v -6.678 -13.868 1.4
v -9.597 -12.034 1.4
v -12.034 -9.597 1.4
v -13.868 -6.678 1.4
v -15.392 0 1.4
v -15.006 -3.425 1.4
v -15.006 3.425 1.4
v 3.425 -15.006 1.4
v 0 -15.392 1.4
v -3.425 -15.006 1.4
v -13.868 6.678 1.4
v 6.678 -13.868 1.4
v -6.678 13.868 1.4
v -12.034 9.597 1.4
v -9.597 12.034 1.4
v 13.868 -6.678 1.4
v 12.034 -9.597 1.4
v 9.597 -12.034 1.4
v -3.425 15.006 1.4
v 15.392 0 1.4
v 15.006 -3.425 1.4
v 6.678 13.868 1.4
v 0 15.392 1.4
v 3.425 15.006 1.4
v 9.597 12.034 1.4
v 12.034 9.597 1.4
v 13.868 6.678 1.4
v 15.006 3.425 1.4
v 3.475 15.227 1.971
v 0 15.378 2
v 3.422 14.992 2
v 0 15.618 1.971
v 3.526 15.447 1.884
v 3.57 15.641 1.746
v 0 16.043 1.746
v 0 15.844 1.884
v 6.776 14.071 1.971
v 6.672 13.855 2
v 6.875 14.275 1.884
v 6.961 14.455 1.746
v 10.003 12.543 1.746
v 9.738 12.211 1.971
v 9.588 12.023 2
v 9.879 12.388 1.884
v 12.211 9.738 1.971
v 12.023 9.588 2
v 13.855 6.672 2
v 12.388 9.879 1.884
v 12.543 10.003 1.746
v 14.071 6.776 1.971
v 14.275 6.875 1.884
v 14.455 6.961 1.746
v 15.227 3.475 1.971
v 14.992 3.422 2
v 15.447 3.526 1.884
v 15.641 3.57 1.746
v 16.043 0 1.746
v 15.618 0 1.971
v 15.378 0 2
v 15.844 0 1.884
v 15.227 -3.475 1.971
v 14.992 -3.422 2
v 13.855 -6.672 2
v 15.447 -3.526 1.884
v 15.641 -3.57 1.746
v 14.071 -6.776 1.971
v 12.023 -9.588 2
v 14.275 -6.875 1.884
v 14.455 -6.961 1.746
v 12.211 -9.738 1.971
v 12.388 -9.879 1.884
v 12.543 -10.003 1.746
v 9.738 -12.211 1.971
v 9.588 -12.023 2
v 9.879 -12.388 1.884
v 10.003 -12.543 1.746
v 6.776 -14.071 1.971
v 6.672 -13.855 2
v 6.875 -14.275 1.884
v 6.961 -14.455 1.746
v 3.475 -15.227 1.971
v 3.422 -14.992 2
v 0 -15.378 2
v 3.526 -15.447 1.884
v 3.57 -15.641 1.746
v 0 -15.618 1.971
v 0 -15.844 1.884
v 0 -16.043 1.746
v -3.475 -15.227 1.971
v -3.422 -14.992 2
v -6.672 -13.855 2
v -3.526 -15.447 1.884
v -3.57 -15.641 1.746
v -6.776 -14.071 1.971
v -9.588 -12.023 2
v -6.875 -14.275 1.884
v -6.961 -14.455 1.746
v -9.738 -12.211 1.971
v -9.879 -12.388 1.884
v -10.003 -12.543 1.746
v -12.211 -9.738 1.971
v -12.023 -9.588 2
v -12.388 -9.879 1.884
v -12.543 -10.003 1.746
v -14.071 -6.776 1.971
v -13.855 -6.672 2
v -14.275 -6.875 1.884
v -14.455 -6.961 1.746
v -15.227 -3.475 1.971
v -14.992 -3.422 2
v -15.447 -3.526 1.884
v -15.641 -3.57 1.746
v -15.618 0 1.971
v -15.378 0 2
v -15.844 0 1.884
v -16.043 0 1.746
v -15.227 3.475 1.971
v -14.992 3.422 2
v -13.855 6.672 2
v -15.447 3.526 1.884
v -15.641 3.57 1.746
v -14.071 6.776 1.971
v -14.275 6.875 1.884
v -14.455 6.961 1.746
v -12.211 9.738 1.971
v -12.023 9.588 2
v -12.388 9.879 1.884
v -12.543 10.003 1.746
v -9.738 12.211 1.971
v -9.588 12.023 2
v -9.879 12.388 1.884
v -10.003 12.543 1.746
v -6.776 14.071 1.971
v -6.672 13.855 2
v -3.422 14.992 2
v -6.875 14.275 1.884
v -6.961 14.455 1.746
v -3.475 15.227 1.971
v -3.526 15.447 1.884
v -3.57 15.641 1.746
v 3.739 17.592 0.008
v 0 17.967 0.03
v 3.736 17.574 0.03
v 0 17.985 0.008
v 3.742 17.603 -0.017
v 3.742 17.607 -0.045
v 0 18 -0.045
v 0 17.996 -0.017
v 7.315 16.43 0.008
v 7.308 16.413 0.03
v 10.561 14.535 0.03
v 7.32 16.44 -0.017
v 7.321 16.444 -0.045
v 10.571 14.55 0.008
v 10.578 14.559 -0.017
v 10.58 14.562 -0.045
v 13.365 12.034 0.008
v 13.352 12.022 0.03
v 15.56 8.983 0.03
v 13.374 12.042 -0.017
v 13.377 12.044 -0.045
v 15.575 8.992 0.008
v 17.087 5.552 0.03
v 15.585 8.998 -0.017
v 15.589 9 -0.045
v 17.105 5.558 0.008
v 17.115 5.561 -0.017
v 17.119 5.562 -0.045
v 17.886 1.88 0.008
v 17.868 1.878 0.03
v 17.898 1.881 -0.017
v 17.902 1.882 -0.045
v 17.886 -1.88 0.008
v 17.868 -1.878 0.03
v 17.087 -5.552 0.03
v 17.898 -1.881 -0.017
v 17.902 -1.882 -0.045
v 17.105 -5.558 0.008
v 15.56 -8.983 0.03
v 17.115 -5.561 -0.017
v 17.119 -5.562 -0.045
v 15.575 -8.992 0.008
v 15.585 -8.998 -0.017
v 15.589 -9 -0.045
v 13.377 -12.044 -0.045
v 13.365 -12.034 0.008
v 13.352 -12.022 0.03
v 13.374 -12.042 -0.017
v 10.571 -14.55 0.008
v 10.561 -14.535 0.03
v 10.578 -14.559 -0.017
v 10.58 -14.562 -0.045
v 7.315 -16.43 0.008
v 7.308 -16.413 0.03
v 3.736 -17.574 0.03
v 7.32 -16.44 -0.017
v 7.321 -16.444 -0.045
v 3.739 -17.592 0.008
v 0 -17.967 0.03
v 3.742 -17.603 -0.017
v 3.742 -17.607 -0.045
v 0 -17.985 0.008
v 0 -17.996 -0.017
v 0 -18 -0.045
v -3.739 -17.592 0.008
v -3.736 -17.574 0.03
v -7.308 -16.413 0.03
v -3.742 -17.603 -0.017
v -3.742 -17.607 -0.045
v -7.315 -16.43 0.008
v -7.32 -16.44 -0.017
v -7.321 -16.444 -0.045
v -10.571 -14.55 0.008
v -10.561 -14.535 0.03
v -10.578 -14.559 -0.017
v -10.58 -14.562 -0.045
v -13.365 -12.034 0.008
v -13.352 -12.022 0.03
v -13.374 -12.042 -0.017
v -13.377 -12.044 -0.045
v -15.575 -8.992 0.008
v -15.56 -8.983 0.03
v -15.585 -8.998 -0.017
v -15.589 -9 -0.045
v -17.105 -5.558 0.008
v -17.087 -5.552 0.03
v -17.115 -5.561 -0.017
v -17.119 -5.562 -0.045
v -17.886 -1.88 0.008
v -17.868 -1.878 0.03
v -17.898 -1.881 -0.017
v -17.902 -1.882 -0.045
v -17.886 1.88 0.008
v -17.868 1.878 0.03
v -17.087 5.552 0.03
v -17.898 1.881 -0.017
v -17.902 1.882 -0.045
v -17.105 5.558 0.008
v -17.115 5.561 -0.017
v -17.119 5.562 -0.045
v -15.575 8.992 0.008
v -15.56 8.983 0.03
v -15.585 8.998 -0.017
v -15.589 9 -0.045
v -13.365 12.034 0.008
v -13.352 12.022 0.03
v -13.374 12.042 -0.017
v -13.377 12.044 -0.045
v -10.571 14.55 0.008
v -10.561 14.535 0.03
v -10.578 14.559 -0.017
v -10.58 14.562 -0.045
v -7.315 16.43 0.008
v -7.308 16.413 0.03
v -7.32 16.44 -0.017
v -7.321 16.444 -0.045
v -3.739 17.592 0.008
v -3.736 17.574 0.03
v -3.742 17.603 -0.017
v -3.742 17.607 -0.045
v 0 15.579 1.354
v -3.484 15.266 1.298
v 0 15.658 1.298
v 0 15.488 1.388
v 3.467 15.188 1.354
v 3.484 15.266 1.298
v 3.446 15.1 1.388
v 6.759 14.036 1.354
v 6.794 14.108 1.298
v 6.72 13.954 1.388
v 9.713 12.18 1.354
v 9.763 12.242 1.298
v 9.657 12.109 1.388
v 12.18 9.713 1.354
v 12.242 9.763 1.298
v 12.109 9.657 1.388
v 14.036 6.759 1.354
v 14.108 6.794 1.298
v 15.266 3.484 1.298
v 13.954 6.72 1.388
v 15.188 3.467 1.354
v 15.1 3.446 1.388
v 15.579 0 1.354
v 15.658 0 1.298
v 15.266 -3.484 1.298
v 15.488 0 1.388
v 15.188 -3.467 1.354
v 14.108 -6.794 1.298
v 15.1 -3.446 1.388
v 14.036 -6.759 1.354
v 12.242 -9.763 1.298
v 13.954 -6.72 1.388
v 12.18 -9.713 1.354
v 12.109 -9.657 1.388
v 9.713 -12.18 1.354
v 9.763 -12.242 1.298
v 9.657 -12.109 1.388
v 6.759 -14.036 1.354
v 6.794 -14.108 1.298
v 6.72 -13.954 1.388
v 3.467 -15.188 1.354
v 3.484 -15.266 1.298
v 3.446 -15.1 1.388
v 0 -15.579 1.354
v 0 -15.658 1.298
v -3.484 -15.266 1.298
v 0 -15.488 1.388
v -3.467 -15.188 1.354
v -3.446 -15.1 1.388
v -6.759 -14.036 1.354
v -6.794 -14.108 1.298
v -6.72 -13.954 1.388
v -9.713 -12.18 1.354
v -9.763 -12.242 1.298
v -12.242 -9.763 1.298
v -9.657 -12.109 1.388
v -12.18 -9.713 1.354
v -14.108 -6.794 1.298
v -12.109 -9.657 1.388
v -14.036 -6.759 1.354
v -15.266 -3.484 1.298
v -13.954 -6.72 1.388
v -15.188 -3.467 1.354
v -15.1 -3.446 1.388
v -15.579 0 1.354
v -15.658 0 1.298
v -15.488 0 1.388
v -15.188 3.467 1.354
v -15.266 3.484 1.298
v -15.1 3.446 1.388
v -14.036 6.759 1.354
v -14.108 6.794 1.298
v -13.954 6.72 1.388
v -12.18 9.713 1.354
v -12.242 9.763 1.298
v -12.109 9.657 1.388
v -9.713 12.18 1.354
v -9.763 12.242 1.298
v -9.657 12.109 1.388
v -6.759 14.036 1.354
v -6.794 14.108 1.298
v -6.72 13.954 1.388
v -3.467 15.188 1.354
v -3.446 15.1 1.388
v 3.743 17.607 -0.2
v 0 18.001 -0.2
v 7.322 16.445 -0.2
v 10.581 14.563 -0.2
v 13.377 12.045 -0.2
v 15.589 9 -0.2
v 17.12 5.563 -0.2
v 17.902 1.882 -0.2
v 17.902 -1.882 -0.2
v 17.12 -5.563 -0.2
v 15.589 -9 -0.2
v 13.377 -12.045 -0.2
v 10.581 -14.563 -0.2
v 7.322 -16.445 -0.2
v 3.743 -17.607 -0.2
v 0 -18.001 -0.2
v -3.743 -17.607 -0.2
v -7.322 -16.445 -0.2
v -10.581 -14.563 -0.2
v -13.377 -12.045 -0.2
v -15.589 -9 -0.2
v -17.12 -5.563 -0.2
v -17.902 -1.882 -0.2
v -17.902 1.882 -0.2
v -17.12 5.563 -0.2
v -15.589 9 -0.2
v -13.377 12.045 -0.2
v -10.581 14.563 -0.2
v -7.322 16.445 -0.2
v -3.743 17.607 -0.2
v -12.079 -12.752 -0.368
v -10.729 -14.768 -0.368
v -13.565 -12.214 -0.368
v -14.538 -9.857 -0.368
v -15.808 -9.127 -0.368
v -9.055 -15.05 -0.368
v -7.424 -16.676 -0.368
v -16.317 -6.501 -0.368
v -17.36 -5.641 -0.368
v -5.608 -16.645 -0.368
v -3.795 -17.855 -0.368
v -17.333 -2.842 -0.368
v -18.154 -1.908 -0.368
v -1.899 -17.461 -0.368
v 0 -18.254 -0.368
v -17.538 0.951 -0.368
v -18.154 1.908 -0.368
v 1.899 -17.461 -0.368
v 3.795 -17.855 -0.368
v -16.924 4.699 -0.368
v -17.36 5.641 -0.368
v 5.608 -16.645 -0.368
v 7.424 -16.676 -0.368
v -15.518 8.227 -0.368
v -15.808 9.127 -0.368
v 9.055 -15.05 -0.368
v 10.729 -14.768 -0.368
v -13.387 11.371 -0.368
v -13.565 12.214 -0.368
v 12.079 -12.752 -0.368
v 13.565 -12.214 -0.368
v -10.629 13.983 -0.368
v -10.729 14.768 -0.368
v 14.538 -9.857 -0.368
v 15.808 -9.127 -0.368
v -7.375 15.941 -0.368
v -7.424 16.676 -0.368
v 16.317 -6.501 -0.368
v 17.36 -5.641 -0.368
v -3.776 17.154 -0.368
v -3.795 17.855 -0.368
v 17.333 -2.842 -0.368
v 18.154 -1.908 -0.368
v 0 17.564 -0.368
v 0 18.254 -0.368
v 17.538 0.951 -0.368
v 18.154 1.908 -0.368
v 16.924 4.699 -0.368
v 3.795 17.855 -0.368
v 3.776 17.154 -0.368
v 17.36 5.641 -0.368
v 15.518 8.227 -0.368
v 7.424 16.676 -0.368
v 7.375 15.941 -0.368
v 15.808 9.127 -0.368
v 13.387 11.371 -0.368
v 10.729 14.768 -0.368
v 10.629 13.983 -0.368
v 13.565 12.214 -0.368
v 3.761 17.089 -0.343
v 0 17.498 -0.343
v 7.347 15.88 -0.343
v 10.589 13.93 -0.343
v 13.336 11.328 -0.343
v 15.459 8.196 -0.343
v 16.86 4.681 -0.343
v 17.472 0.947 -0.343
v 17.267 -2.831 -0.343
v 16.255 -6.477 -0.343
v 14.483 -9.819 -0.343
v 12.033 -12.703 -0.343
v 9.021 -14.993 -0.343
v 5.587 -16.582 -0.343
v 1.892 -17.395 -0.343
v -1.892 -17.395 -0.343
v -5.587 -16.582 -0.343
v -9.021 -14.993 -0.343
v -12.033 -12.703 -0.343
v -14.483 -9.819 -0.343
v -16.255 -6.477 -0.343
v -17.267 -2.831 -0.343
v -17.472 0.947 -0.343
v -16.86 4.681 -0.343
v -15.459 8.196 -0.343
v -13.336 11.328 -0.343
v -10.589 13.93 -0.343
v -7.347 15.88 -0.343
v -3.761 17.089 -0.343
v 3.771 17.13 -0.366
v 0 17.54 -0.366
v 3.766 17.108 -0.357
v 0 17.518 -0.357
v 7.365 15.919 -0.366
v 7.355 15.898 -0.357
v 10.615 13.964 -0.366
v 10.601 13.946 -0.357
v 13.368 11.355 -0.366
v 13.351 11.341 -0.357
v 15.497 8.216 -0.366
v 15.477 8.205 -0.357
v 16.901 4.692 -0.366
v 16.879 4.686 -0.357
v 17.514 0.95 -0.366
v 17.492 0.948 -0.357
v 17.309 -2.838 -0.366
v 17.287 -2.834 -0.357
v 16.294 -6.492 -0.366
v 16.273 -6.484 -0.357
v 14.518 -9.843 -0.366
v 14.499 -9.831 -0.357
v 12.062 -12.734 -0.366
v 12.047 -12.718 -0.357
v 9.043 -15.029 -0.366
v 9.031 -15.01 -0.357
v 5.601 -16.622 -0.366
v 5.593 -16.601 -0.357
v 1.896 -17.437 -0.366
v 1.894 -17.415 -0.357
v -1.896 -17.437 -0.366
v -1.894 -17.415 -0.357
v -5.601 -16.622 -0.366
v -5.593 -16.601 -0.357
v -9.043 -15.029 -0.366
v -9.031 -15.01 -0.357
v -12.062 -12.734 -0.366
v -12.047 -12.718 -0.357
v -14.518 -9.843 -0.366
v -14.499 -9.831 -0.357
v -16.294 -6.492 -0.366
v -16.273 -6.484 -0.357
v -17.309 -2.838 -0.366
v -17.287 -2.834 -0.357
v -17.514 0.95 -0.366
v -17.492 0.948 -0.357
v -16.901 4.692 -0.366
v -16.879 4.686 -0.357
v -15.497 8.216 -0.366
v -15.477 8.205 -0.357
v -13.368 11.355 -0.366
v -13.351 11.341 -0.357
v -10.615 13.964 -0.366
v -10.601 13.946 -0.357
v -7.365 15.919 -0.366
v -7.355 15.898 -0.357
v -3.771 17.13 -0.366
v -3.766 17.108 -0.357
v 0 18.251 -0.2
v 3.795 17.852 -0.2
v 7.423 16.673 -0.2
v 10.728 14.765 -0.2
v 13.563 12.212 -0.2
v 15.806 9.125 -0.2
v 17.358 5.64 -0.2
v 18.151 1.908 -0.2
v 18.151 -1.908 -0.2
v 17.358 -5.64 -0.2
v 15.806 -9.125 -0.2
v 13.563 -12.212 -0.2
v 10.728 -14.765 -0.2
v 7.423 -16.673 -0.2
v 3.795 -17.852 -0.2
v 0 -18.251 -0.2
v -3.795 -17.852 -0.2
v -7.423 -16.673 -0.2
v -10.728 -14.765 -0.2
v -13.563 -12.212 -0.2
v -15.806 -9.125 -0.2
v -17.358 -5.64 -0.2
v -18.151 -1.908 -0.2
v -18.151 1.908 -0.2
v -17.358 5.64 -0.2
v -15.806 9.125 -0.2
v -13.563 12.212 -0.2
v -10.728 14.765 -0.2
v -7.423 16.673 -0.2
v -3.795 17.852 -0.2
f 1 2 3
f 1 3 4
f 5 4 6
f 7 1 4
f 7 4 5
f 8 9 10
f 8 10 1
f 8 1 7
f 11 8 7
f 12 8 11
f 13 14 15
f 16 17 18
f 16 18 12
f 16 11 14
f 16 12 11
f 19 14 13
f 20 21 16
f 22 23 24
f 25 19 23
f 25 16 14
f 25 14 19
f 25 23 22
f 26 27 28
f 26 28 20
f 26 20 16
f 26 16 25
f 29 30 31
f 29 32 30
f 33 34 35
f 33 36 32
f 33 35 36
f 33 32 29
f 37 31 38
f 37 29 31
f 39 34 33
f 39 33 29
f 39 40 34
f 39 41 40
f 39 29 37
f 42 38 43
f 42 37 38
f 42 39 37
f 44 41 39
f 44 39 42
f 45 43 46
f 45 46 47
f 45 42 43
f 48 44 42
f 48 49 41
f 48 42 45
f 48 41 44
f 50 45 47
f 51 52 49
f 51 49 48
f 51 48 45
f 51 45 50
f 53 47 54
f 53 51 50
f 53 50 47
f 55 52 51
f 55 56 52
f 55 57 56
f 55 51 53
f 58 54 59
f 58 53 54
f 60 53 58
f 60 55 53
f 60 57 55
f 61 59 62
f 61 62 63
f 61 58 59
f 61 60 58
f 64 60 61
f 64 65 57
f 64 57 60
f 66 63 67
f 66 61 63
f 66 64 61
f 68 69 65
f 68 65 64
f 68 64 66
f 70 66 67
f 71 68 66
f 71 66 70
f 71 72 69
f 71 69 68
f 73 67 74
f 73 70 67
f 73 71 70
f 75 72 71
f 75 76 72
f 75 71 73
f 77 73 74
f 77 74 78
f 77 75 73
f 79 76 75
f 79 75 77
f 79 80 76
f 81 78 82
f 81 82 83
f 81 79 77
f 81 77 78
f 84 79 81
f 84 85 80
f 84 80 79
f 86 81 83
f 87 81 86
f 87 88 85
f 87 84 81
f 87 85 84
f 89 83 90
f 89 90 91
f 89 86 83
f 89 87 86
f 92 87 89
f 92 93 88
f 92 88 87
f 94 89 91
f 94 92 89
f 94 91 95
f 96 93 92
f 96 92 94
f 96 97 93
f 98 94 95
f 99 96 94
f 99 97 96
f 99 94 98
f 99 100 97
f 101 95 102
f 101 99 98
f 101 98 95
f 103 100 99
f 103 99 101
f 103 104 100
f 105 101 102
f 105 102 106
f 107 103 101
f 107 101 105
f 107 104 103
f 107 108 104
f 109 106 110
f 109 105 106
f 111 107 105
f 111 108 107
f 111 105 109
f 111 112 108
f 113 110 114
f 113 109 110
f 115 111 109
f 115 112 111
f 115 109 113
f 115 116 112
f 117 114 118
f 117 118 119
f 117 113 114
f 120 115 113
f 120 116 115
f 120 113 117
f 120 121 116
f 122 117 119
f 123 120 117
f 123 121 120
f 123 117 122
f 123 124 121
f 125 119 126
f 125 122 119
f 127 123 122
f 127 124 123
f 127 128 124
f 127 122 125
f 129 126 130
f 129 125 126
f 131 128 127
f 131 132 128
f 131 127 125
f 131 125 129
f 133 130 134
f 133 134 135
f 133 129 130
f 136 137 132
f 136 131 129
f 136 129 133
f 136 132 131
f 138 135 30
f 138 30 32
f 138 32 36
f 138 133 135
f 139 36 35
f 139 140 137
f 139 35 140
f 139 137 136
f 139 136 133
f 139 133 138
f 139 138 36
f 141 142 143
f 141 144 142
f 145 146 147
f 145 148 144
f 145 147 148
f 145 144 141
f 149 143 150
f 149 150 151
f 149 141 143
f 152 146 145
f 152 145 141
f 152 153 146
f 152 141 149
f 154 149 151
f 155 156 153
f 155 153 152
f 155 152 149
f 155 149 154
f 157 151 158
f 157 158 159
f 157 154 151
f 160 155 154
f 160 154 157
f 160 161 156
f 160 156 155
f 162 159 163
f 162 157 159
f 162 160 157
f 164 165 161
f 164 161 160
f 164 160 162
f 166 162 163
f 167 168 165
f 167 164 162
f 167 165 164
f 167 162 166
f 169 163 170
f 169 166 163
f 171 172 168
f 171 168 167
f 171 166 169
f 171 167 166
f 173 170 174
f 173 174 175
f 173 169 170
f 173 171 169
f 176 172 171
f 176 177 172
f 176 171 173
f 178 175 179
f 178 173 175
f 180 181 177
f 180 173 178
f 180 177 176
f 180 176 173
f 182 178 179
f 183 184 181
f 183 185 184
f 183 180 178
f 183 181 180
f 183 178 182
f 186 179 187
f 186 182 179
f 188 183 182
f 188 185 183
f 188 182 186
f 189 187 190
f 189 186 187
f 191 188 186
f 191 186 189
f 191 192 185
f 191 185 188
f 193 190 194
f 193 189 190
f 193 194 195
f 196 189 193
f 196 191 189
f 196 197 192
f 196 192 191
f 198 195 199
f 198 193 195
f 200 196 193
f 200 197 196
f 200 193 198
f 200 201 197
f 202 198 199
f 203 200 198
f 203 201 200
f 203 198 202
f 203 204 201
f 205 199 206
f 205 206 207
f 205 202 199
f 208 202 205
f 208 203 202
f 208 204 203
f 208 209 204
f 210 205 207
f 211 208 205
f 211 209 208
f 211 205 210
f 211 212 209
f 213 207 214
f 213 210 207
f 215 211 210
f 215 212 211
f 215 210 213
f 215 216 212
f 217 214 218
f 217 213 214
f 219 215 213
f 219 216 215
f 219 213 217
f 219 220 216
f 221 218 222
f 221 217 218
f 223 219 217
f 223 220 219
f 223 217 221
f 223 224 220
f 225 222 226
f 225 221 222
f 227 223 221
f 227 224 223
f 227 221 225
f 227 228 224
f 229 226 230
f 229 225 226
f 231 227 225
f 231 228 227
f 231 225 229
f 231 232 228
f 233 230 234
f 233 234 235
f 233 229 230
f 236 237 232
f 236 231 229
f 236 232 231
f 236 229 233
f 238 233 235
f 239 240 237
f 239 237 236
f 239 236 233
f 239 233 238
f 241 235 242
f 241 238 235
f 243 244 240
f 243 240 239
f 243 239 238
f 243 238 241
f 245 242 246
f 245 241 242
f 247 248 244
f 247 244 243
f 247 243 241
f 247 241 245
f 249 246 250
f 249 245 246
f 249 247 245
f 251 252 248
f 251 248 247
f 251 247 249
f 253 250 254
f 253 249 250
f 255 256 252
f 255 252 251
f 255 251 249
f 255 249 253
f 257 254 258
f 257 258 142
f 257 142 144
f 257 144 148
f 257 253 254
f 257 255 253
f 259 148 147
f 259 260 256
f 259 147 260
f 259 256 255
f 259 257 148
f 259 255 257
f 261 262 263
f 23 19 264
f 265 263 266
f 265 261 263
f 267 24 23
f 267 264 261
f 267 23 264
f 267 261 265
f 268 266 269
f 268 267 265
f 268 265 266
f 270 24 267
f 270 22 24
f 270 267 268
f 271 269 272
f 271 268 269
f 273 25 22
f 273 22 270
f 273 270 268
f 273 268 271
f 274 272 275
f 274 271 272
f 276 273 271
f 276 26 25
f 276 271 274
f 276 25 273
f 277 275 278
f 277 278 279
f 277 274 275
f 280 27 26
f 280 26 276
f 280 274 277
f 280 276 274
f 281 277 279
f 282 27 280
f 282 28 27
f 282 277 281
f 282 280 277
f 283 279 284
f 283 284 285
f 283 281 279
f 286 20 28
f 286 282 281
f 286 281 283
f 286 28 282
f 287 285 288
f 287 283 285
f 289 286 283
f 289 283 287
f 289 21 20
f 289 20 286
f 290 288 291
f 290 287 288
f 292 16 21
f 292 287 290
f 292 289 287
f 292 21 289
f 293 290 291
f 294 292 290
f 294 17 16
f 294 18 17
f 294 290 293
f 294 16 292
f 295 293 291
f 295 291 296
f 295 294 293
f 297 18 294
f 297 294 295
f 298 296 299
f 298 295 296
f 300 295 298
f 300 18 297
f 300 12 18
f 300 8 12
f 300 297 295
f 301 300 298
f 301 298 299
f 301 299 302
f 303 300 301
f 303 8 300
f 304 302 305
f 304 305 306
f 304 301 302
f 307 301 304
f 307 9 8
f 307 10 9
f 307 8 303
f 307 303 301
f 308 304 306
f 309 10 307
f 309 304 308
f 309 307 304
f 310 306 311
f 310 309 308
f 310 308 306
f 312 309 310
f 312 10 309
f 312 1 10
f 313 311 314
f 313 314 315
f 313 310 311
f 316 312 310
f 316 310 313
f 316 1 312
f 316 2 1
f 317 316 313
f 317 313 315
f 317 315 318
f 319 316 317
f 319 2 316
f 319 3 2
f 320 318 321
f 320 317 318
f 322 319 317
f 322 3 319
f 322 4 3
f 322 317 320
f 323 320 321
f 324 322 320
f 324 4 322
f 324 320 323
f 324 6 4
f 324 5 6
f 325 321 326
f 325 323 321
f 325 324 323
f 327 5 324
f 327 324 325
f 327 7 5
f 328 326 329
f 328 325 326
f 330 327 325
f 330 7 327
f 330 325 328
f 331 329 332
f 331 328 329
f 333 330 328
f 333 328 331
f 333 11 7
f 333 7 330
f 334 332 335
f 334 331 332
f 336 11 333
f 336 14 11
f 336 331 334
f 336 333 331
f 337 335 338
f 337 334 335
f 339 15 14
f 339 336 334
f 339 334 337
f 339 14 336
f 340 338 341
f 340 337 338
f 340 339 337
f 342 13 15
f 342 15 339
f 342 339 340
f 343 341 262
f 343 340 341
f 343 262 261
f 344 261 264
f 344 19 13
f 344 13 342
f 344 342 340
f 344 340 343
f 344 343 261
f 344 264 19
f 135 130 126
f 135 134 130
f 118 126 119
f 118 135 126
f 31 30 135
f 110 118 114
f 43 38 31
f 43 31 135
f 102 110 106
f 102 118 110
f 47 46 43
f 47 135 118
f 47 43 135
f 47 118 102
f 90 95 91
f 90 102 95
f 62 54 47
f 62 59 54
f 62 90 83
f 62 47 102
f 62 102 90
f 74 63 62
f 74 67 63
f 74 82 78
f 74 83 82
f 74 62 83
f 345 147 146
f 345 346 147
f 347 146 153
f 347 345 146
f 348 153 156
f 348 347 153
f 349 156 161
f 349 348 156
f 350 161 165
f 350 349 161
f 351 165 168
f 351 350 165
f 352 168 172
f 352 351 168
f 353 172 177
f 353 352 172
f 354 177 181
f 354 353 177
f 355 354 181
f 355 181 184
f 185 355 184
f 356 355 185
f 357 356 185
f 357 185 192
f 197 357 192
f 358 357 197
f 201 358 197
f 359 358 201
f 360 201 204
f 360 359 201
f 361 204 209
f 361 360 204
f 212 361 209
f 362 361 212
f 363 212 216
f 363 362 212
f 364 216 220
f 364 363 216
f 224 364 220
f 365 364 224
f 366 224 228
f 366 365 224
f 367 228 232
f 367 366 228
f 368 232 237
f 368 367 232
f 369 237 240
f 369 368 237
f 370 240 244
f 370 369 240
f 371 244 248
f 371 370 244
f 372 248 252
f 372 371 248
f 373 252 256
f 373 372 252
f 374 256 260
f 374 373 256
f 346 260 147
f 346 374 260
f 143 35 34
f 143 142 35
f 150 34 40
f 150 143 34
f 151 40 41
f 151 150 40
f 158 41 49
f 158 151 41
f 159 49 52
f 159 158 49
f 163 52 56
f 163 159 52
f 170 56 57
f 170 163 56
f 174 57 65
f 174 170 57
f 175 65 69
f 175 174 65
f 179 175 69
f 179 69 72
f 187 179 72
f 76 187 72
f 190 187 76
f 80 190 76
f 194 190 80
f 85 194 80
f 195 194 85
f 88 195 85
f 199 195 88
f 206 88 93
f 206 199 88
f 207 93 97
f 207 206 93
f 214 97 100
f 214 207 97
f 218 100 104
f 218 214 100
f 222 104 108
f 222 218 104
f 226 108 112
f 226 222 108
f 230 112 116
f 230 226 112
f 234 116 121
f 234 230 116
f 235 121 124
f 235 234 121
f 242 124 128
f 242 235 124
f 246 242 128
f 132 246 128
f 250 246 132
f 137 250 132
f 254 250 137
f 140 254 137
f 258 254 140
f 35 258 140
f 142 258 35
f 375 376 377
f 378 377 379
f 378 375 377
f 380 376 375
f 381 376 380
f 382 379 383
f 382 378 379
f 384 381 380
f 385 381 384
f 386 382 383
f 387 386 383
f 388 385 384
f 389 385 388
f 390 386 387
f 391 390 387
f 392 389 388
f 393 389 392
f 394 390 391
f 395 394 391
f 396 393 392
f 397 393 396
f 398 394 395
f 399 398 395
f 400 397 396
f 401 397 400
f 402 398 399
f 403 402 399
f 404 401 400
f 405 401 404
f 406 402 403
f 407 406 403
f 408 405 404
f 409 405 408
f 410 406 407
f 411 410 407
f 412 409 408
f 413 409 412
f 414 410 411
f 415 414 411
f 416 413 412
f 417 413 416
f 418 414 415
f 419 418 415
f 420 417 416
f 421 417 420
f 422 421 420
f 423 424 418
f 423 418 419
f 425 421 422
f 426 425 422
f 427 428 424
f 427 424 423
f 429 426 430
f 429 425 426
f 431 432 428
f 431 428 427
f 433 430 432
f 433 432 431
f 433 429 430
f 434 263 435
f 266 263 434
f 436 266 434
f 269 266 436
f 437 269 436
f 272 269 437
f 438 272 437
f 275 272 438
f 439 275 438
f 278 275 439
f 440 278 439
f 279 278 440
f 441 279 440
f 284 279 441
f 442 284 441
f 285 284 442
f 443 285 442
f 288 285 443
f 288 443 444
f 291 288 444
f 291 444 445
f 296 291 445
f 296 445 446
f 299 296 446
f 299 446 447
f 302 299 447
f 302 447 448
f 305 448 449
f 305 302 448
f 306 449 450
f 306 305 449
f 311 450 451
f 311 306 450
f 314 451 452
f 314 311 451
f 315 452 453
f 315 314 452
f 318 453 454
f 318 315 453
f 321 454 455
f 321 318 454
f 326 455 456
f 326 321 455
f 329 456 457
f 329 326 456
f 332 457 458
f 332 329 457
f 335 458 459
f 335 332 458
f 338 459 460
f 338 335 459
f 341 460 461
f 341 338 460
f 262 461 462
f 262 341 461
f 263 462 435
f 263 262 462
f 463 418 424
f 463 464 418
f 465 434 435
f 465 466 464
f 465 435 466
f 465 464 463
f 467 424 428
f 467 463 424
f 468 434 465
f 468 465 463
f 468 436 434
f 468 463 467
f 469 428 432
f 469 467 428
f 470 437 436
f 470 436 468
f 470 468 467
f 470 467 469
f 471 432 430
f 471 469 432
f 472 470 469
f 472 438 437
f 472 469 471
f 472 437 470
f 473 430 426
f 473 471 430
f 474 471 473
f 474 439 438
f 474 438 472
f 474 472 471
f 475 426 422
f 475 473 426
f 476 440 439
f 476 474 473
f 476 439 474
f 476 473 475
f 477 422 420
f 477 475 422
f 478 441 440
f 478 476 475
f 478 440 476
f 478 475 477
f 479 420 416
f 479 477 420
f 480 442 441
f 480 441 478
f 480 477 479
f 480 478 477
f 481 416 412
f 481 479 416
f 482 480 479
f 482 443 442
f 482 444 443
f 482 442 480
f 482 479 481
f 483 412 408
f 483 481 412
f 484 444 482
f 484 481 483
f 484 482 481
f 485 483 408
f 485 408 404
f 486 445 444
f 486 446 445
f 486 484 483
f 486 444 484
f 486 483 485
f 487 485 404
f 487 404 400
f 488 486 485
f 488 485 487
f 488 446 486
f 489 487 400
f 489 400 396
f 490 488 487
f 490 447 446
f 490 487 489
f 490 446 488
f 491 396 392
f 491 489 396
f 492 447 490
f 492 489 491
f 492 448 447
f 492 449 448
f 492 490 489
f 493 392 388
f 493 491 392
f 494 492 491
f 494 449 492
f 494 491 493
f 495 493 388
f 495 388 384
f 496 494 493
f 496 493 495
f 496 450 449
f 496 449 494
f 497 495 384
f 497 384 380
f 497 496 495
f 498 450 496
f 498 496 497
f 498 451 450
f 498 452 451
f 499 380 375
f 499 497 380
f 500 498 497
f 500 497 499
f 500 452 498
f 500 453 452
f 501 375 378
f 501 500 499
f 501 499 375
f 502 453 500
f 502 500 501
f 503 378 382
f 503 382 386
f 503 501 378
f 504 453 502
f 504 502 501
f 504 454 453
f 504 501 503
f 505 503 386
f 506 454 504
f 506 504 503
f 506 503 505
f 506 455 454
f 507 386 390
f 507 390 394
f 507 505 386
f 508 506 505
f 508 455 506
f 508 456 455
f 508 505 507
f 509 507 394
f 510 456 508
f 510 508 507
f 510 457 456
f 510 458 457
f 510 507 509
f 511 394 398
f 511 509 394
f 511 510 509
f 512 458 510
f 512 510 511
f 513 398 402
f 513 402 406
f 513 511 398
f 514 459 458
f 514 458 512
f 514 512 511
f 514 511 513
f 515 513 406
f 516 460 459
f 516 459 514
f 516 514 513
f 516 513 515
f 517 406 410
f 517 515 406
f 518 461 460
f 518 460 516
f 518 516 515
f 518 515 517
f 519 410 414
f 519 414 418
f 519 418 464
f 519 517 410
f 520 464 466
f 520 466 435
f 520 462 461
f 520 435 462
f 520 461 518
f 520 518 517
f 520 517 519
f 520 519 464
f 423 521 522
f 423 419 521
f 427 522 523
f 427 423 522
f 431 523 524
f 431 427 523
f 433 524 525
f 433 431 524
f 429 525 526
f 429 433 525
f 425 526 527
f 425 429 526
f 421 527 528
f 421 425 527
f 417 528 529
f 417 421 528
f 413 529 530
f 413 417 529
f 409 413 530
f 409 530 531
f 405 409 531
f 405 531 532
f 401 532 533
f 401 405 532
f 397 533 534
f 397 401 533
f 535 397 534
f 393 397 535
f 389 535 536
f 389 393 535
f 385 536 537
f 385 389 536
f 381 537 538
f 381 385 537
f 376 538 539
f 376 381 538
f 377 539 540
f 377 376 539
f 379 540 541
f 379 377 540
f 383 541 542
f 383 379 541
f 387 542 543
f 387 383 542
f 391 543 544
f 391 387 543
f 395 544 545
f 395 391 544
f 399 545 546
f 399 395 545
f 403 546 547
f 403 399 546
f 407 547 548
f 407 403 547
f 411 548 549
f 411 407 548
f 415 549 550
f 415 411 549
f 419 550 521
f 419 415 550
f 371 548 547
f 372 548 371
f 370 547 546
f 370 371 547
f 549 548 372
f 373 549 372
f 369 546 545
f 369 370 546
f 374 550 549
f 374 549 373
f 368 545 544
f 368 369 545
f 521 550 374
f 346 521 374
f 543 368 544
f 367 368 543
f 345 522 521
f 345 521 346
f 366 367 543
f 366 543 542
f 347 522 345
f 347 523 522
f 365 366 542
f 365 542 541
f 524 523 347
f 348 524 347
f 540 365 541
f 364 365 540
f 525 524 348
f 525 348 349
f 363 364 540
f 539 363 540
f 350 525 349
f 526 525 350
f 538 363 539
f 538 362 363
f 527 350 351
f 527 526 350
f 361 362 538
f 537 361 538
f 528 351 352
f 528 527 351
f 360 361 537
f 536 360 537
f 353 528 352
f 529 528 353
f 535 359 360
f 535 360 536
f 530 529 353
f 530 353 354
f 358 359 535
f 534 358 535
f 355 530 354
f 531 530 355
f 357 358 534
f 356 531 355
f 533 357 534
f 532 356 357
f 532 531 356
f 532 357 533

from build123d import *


with BuildPart() as part:
    # Sketch1 → Revolve1 (revolve)
    with BuildSketch(Plane(origin=(0, 0, 0), x_dir=(0, 0, -1), z_dir=(1, 0, 0))):
        with BuildLine():
            Line((0.199998156, 18.250858843), (0.368480901, 18.253649875))
            Line((0.368480901, 18.253649875), (0.368480901, 17.564198472))
            ThreePointArc((0.368480901, 17.564198472), (0.36191796, 17.528568202), (0.34309058, 17.497614721))
            Line((0.34309058, 17.497614721), (-1.298438714, 15.6582174))
            ThreePointArc((-1.298438714, 15.6582174), (-1.373748235, 15.534403473), (-1.4, 15.391882396))
            Line((-1.4, 15.391882396), (-1.4, 0))
            Line((-1.4, 0), (-2, 0))
            Line((-2, 0), (-2, 15.377593236))
            ThreePointArc((-2, 15.377593236), (-1.934370586, 15.733895926), (-1.746096785, 16.043430744))
            Line((-1.746096785, 16.043430744), (-0.029650113, 17.966775897))
            ThreePointArc((-0.029650113, 17.966775897), (0.003888132, 17.991368554), (0.044530144, 18.000191224))
            Line((0.044530144, 18.000191224), (0.199998156, 18.000858843))
            Line((0.199998156, 18.000858843), (0.199998156, 18.250858843))
        make_face()
    revolve(axis=Axis((0, 0, 10.644061054), (0, 0, -1)))


solid = part.part
